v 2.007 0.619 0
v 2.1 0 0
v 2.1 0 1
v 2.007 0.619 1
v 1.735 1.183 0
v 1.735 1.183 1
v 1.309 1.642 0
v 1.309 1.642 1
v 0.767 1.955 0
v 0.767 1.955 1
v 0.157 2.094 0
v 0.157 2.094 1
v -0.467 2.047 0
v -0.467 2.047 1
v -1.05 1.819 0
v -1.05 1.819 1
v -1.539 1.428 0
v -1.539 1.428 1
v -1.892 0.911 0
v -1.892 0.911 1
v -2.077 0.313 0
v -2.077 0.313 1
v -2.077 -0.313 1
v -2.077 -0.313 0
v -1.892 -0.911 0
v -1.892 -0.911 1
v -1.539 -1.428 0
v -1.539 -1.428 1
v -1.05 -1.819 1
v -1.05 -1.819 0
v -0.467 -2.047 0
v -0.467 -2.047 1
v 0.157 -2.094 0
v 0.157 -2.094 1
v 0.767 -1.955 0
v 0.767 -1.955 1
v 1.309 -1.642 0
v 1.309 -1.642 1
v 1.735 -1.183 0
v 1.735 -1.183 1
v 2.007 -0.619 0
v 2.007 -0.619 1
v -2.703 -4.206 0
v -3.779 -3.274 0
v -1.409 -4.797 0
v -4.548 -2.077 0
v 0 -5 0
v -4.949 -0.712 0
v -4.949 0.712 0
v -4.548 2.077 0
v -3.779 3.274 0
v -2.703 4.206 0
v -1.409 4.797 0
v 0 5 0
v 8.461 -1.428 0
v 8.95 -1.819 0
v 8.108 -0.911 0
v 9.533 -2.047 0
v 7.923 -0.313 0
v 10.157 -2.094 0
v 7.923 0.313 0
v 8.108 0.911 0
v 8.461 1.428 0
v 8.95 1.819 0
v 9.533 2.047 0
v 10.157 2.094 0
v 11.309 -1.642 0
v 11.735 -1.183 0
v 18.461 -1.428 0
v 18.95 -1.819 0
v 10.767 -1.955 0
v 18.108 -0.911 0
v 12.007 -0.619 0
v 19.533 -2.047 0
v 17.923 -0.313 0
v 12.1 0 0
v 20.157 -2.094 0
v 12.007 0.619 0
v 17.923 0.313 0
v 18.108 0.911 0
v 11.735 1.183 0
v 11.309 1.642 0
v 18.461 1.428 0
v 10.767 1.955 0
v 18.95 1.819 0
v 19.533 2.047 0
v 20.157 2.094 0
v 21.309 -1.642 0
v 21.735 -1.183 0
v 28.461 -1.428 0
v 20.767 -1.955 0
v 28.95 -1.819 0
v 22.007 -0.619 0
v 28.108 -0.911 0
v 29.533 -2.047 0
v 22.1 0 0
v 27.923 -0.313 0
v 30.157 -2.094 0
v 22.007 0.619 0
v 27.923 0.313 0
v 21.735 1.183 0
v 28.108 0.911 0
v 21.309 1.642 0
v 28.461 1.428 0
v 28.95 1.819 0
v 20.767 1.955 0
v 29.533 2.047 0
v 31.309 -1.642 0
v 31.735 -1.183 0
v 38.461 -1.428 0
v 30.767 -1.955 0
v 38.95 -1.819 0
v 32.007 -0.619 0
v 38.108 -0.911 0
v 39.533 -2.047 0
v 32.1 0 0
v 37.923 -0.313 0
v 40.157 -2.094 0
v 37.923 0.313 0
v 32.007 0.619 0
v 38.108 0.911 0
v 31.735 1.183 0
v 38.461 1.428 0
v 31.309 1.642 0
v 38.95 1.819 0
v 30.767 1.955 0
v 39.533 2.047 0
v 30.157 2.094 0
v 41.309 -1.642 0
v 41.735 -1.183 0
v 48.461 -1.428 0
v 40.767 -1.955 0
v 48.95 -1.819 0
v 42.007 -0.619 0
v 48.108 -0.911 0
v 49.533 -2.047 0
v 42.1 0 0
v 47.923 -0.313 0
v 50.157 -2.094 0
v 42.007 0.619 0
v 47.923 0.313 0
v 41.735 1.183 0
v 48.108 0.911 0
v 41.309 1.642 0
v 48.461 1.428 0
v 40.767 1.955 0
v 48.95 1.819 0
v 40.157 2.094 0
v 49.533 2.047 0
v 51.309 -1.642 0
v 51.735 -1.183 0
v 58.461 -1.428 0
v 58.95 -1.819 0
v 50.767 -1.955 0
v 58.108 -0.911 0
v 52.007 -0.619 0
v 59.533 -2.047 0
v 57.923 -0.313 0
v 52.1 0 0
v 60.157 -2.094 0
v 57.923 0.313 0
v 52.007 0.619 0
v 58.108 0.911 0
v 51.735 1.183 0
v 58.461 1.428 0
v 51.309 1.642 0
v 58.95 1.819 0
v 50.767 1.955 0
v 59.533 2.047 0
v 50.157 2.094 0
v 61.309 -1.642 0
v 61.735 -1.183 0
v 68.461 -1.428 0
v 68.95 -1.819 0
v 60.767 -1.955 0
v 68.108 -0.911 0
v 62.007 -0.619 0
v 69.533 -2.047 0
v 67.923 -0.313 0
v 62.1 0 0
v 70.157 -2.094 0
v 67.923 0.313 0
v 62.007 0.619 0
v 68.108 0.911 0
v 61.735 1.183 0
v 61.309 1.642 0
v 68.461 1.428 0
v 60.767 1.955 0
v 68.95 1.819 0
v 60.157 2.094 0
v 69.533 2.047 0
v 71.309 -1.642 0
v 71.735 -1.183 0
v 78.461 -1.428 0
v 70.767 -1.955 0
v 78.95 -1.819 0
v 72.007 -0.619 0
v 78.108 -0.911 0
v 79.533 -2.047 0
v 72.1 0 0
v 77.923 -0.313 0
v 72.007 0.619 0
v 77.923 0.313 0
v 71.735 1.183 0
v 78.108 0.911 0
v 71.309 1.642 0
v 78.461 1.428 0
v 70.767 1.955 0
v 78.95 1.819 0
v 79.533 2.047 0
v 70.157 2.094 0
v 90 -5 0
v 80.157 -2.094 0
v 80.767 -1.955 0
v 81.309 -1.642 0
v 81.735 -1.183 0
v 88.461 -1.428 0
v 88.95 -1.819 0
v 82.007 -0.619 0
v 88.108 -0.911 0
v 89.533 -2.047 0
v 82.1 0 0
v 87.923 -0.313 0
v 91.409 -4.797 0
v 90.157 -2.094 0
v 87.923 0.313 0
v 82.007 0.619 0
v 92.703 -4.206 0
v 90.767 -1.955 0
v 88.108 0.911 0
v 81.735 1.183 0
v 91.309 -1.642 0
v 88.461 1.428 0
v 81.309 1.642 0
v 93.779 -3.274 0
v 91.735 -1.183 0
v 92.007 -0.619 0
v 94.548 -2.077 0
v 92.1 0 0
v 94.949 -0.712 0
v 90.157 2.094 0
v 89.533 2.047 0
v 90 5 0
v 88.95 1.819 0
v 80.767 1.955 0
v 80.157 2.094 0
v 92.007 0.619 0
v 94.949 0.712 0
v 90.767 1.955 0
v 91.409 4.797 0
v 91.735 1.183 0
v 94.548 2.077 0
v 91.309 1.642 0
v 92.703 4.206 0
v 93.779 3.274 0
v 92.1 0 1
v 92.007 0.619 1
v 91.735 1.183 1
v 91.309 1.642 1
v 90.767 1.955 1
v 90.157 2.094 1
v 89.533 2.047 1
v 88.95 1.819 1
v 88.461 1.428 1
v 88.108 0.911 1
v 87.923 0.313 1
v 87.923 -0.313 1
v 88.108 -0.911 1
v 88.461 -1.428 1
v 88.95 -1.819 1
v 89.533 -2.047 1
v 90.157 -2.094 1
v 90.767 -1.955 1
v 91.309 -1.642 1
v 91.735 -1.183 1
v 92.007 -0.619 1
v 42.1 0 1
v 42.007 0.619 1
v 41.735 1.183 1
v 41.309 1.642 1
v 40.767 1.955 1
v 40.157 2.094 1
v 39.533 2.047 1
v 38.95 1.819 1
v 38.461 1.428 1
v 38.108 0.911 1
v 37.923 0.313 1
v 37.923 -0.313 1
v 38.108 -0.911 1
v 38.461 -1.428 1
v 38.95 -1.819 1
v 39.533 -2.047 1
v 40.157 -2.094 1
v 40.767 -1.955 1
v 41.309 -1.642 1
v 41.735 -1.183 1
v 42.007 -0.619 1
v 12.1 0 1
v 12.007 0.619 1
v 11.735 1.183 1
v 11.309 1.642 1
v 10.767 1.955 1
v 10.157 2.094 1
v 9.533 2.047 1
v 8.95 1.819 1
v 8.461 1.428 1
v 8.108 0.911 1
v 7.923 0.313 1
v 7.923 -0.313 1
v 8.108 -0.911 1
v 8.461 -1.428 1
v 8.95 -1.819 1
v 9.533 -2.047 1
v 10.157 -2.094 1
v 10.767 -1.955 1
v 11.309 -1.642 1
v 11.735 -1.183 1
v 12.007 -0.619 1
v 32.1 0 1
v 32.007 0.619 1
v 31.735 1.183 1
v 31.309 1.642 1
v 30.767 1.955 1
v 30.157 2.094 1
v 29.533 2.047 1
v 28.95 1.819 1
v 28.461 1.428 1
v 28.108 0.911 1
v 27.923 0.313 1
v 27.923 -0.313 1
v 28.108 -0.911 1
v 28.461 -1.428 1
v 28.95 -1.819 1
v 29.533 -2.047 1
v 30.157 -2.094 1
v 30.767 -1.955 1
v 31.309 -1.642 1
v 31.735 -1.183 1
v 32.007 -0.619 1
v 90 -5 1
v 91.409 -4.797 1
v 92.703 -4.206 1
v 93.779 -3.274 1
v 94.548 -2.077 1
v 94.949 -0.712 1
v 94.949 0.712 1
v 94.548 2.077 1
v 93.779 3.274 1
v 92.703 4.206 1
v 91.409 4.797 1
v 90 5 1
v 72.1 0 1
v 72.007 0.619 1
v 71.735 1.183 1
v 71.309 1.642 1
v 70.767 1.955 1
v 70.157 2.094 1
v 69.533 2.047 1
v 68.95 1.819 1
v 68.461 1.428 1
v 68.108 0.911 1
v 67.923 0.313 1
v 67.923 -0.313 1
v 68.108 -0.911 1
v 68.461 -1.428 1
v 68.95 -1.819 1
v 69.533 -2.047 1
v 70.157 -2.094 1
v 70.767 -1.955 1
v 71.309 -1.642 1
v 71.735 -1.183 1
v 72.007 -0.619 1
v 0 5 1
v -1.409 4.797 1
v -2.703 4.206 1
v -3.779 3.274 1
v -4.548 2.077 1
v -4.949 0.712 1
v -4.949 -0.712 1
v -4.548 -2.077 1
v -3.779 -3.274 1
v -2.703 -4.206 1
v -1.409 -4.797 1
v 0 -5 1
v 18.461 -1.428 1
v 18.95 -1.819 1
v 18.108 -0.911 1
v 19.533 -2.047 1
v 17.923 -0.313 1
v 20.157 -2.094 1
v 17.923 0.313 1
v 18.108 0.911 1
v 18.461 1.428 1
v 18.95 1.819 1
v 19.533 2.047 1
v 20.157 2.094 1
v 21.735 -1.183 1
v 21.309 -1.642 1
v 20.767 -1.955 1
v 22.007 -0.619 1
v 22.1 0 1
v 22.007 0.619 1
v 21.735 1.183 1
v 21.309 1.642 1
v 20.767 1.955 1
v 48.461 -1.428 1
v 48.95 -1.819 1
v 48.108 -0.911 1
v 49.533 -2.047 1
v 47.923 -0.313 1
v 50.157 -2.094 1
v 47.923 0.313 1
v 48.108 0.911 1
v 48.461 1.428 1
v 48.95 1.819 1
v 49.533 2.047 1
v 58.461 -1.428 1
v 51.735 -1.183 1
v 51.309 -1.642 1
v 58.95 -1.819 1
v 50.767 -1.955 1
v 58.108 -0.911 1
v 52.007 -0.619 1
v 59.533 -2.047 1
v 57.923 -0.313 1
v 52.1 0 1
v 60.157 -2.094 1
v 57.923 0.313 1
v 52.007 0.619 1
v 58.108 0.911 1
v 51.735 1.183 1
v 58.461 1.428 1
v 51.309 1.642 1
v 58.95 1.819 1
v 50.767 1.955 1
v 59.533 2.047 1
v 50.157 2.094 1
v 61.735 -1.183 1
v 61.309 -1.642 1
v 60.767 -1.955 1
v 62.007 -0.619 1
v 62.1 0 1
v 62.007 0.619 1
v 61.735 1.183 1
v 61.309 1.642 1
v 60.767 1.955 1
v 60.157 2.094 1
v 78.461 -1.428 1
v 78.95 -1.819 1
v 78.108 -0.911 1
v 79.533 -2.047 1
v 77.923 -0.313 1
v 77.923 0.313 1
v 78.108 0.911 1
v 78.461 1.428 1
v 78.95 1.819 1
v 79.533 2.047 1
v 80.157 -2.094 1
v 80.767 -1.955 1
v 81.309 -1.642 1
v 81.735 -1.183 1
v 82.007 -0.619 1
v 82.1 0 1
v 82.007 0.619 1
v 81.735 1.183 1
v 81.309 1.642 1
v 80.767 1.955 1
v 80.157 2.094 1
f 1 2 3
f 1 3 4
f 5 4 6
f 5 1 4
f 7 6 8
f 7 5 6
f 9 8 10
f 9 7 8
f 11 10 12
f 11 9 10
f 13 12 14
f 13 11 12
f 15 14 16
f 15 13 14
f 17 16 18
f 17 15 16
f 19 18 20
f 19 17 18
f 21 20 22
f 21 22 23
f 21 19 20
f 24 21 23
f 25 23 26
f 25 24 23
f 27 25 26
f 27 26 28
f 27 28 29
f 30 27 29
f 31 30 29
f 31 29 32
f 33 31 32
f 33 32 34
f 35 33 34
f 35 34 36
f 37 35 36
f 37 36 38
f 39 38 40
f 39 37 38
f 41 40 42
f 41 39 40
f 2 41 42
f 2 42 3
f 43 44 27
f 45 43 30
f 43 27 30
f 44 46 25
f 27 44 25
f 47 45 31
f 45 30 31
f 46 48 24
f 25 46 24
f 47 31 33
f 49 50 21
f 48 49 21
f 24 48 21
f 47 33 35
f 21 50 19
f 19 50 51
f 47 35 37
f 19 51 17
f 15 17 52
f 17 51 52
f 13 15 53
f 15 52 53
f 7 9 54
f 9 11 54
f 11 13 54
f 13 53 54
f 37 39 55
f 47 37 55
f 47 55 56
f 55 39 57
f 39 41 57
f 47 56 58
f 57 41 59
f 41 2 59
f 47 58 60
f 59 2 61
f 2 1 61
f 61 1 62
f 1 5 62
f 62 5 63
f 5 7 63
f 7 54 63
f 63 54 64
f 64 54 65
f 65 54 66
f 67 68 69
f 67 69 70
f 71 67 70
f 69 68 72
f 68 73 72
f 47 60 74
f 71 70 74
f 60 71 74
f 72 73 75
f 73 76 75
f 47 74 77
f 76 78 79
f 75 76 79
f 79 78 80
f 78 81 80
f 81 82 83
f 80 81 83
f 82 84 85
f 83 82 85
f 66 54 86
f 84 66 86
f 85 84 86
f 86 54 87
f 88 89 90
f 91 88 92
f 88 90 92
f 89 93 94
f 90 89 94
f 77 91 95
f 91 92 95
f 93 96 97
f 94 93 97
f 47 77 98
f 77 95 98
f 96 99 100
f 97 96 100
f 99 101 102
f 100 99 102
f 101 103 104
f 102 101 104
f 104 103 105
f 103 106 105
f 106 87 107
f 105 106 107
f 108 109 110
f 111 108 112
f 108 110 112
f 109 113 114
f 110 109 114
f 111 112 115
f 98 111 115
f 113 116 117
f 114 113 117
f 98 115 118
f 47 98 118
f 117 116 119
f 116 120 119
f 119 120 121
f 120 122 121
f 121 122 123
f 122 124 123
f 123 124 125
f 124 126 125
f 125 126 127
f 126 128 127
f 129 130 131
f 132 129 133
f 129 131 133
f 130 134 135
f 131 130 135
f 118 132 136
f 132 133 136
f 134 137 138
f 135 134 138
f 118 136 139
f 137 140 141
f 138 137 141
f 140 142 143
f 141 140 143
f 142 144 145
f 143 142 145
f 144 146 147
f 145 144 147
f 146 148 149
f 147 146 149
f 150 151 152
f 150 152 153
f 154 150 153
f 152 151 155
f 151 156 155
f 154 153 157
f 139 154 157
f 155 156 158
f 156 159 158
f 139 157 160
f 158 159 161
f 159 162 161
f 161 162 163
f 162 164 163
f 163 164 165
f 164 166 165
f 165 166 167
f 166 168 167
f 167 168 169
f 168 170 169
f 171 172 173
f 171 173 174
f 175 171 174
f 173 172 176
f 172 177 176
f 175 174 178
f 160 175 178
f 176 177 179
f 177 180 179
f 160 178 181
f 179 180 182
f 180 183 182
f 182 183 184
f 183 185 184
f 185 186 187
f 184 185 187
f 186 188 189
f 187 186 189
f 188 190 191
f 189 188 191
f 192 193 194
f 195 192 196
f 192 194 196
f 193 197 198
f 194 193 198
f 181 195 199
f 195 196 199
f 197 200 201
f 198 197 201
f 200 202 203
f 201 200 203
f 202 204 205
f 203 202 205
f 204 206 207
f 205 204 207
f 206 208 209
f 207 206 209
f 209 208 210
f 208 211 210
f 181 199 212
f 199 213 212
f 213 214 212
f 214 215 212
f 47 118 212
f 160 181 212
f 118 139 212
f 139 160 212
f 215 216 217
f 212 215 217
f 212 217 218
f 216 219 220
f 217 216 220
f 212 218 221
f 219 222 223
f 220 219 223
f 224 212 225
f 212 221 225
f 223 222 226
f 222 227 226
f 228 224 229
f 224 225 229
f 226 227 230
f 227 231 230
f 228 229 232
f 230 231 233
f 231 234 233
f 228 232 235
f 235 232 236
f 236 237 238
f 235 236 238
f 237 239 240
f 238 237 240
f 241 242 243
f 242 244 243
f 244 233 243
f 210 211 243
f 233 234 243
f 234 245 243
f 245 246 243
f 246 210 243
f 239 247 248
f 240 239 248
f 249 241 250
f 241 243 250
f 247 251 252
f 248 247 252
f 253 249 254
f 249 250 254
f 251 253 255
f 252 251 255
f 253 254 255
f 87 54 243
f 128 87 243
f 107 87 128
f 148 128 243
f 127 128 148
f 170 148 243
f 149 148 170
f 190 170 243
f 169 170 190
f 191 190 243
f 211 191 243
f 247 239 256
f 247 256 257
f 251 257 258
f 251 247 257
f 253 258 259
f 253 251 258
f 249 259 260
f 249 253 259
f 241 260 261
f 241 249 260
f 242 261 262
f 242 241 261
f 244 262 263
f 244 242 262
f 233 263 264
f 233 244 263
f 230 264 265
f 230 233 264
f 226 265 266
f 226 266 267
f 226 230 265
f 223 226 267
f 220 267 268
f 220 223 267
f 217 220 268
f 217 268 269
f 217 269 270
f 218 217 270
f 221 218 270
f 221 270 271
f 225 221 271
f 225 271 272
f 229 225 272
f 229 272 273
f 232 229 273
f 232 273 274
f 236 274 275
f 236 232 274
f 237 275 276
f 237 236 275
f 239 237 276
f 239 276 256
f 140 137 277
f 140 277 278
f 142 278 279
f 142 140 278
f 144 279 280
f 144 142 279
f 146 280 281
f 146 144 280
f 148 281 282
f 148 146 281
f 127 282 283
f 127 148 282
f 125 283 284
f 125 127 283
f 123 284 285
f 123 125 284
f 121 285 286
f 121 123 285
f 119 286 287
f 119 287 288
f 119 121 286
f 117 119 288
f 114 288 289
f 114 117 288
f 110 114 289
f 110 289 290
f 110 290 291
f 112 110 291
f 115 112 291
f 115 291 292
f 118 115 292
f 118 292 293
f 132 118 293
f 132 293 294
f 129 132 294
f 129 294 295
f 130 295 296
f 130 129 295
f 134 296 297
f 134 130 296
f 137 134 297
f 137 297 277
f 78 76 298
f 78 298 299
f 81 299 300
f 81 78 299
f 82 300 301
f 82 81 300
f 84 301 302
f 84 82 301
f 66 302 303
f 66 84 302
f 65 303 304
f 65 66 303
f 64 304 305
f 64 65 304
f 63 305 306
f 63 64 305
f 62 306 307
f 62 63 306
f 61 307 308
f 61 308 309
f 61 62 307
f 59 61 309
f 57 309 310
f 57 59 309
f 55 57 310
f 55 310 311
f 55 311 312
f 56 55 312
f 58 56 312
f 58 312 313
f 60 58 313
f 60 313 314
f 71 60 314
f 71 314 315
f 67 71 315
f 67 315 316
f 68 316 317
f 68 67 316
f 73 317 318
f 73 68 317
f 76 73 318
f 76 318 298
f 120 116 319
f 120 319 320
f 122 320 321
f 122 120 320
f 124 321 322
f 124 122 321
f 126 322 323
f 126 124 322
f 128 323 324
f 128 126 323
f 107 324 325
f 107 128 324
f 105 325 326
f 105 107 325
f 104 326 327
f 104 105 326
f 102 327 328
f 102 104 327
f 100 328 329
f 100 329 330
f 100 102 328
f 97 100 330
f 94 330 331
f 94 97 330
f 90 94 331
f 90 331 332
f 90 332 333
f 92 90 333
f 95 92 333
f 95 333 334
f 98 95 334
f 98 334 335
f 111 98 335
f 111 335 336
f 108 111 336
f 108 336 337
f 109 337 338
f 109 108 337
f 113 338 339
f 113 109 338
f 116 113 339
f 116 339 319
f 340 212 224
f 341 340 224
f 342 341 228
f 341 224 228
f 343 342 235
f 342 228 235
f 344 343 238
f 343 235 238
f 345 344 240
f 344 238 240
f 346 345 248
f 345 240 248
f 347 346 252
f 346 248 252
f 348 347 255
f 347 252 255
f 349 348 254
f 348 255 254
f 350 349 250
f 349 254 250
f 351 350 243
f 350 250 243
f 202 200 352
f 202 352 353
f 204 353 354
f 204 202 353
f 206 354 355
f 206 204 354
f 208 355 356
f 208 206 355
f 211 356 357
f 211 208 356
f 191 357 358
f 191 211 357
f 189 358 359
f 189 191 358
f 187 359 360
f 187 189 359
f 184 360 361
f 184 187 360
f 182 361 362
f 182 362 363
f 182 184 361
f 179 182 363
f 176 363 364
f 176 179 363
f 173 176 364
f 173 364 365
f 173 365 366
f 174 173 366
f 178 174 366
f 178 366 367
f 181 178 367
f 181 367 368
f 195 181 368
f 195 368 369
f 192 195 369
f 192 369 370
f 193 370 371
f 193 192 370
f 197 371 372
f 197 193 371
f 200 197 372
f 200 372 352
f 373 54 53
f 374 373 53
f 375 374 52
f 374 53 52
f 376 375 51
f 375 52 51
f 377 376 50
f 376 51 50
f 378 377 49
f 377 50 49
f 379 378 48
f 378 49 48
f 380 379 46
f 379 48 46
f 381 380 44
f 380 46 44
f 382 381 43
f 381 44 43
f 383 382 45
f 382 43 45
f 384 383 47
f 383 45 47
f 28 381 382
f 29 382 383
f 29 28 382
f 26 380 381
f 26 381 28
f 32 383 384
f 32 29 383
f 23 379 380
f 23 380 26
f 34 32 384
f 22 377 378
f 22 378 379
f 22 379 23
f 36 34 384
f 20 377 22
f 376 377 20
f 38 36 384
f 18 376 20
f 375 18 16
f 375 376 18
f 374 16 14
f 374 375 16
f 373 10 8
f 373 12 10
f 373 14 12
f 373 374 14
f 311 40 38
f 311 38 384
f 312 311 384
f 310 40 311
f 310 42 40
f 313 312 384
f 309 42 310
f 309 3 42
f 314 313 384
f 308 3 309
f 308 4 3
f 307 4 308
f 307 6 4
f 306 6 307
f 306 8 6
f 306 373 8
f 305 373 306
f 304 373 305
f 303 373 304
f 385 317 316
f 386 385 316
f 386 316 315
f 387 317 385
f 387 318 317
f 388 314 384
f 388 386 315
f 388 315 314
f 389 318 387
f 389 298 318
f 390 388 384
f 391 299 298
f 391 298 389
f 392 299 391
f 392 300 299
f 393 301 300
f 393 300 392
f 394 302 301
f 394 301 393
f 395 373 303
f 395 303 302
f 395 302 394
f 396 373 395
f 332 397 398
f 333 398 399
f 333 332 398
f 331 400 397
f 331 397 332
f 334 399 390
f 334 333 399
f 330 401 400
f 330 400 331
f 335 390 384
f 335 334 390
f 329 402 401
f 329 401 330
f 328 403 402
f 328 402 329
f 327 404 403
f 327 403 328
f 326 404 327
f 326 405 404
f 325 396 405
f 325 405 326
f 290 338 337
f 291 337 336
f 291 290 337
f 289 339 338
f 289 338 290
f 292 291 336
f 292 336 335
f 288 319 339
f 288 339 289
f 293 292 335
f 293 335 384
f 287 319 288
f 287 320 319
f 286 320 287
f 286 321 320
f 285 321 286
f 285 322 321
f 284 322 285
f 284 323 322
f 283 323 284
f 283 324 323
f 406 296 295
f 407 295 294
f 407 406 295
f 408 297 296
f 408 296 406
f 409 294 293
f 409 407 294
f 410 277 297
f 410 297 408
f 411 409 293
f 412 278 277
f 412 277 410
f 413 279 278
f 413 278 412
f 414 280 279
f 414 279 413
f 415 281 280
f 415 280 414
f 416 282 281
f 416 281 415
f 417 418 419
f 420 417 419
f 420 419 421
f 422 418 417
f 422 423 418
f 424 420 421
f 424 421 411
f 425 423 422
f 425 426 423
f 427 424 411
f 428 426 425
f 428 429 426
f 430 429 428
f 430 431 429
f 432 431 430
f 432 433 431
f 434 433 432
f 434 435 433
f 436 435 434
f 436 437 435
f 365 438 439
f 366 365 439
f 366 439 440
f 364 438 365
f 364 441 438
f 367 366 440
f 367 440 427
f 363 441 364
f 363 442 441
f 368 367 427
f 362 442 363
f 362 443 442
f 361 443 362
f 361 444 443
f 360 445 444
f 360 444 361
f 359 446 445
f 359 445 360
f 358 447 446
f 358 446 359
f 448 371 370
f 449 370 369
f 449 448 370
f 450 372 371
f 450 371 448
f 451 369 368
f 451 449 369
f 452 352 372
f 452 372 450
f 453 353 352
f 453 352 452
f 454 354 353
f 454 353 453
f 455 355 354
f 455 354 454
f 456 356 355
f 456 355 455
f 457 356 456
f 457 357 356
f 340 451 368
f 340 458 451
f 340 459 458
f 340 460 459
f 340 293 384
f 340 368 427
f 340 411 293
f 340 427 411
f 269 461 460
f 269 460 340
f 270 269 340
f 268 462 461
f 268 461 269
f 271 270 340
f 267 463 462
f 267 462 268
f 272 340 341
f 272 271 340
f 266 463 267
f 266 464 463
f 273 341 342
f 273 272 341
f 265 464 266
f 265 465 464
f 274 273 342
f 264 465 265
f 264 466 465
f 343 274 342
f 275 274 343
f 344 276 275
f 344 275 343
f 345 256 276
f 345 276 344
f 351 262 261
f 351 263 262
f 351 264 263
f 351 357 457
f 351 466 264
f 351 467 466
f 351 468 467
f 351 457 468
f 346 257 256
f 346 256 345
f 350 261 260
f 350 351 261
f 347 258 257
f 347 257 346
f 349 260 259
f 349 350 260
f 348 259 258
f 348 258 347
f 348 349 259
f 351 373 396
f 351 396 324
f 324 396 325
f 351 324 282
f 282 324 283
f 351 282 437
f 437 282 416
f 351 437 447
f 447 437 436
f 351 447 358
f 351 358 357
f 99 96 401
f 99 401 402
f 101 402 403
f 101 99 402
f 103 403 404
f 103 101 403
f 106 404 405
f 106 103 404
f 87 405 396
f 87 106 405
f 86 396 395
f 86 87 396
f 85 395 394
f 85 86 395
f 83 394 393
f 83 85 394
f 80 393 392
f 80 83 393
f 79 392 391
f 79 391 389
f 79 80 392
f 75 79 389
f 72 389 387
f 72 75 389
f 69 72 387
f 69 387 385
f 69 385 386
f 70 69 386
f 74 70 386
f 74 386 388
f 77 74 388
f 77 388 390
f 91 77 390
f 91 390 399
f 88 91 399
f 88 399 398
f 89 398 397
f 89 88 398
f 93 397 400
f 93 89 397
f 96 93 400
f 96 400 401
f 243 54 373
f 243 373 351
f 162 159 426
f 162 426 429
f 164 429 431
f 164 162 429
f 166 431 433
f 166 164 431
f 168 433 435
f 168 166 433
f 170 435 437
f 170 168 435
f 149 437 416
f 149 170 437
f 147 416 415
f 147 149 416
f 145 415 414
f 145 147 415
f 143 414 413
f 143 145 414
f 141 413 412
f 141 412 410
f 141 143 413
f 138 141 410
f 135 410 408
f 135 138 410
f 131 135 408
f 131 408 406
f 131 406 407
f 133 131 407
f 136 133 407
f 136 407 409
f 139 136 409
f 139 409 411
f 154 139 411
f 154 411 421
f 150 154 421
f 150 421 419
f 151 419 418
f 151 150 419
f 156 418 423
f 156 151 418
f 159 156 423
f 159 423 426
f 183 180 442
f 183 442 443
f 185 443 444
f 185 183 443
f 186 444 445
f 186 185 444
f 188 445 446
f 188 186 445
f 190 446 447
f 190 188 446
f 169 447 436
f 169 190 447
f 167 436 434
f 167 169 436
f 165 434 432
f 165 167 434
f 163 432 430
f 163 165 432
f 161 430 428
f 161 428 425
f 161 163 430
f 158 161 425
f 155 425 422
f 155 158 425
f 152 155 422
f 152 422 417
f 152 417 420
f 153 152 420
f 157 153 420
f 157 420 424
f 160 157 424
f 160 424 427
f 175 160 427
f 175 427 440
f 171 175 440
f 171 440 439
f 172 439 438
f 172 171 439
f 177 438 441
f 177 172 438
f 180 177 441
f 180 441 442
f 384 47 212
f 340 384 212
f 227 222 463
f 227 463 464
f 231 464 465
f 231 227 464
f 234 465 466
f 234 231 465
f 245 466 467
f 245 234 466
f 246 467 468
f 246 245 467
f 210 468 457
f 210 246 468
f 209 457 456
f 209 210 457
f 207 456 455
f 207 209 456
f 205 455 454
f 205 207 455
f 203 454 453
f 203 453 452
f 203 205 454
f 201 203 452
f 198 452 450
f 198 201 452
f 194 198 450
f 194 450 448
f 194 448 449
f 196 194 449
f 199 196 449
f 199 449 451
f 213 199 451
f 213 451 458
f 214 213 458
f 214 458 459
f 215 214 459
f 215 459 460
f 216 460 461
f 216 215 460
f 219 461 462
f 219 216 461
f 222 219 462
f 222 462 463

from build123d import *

# Parameters (mm, degrees)
SKETCH_R  = 2.1
PAD_DEPTH = 1


with BuildPart() as part:
    # Sketch → Pad (new body)
    with BuildSketch(Plane.XY):
        with BuildLine():
            ThreePointArc((0, 5), (-5, 0), (0, -5))
            Line((0, -5), (90, -5))
            ThreePointArc((90, -5), (95, 0), (90, 5))
            Line((0, 5), (90, 5))
        make_face()
        Circle(SKETCH_R, mode=Mode.SUBTRACT)
        with Locations((10, 0)):
            Circle(SKETCH_R, mode=Mode.SUBTRACT)
        with Locations((20, 0)):
            Circle(SKETCH_R, mode=Mode.SUBTRACT)
        with Locations((30, 0)):
            Circle(SKETCH_R, mode=Mode.SUBTRACT)
        with Locations((40, 0)):
            Circle(SKETCH_R, mode=Mode.SUBTRACT)
        with Locations((50, 0)):
            Circle(SKETCH_R, mode=Mode.SUBTRACT)
        with Locations((60, 0)):
            Circle(SKETCH_R, mode=Mode.SUBTRACT)
        with Locations((70, 0)):
            Circle(SKETCH_R, mode=Mode.SUBTRACT)
        with Locations((80, 0)):
            Circle(SKETCH_R, mode=Mode.SUBTRACT)
        with Locations((90, 0)):
            Circle(SKETCH_R, mode=Mode.SUBTRACT)
    extrude(amount=PAD_DEPTH)


solid = part.part
